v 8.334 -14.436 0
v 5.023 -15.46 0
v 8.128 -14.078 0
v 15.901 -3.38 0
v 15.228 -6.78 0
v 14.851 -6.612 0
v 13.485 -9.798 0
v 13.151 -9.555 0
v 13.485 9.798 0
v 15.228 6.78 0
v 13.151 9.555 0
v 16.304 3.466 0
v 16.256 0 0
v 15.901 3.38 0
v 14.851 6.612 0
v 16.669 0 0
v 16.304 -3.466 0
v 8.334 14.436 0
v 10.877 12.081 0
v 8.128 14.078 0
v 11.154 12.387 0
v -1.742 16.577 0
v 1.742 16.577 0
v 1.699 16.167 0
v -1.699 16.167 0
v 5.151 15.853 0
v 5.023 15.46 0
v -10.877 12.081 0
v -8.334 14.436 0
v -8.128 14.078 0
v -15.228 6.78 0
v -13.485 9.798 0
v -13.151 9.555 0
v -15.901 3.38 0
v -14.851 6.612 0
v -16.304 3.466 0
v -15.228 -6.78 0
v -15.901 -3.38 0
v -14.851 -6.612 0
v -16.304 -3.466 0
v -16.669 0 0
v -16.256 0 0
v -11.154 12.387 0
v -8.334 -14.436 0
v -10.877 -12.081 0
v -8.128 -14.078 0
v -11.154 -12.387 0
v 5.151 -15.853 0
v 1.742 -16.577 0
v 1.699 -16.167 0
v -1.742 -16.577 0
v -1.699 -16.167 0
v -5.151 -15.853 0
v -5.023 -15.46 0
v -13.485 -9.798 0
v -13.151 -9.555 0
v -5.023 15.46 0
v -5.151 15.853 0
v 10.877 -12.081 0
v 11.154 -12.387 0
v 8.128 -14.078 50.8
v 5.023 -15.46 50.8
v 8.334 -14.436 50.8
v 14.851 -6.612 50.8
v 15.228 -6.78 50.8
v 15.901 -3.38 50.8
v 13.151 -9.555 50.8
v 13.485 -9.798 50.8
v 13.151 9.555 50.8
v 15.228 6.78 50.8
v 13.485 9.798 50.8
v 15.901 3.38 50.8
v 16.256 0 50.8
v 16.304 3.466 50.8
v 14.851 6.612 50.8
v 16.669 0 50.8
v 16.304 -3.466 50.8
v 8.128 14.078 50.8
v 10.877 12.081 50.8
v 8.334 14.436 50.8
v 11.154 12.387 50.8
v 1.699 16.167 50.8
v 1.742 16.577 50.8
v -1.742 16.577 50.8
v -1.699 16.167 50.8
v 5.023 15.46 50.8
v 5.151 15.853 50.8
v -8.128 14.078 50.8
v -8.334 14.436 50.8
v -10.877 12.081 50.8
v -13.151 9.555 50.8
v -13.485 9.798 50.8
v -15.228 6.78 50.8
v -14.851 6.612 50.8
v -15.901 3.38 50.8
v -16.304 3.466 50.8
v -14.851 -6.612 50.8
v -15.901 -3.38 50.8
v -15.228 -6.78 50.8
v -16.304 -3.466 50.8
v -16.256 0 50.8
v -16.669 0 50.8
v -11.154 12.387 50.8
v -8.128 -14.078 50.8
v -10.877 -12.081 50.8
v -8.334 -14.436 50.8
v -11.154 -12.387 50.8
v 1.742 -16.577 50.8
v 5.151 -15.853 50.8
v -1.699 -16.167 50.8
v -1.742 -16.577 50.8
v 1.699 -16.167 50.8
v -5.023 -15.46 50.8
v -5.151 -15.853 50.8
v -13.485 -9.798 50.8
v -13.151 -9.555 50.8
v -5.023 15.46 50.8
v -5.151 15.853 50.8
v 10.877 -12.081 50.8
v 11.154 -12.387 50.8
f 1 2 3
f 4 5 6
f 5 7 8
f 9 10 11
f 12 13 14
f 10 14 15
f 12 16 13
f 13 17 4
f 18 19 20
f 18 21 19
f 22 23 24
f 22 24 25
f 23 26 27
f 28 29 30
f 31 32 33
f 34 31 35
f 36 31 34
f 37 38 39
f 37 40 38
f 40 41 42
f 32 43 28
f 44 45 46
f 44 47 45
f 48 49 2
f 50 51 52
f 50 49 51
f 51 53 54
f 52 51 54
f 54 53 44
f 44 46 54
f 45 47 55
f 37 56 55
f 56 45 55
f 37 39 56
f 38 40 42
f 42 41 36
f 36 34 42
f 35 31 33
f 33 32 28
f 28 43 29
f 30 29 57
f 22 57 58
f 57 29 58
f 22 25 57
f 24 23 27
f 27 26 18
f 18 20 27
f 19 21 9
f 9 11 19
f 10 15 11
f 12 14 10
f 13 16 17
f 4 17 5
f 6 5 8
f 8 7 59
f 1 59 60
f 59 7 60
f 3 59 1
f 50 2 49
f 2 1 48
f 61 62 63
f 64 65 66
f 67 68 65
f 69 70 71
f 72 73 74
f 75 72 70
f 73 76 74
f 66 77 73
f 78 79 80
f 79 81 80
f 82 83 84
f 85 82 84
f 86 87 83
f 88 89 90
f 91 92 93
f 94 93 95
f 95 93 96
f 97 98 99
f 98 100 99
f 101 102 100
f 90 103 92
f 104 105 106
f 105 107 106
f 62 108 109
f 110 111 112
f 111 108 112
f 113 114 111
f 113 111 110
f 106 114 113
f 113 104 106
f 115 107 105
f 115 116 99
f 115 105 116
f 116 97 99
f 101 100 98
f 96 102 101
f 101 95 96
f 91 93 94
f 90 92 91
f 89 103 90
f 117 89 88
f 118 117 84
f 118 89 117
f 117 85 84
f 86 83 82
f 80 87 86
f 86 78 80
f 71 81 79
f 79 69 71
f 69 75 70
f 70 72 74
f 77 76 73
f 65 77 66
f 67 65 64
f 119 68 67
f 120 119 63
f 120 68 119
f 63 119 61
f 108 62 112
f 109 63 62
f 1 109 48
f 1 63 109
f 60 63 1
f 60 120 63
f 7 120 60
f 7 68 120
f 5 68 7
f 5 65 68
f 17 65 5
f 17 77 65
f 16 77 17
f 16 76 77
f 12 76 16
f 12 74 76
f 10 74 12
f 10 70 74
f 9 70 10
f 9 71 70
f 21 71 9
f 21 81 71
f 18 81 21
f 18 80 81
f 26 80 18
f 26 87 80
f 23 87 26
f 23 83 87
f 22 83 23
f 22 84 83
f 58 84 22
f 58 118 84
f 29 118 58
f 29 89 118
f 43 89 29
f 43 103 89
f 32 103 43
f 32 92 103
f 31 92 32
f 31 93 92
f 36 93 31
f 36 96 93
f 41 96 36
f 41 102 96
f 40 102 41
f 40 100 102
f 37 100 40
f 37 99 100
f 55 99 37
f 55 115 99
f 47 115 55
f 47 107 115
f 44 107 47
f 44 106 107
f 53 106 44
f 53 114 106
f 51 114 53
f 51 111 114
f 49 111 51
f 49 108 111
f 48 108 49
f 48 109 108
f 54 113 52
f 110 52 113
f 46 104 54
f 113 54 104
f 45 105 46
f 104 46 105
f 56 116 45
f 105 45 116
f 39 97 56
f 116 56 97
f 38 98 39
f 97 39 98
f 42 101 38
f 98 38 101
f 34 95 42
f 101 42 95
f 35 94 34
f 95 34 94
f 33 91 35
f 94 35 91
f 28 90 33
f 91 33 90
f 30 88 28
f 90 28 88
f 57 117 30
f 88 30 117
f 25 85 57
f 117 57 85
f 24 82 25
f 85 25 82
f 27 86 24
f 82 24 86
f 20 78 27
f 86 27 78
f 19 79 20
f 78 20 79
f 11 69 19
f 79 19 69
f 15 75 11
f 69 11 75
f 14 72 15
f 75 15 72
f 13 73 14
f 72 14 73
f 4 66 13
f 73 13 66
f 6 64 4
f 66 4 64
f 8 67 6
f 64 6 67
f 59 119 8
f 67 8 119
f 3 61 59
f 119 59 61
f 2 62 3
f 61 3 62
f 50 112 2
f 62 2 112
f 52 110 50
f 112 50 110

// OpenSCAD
in = 25.4;
linear_extrude(height=2*in) 
difference() {
    circle(d=1.3125*in);
    circle(d=1.28*in);
}
